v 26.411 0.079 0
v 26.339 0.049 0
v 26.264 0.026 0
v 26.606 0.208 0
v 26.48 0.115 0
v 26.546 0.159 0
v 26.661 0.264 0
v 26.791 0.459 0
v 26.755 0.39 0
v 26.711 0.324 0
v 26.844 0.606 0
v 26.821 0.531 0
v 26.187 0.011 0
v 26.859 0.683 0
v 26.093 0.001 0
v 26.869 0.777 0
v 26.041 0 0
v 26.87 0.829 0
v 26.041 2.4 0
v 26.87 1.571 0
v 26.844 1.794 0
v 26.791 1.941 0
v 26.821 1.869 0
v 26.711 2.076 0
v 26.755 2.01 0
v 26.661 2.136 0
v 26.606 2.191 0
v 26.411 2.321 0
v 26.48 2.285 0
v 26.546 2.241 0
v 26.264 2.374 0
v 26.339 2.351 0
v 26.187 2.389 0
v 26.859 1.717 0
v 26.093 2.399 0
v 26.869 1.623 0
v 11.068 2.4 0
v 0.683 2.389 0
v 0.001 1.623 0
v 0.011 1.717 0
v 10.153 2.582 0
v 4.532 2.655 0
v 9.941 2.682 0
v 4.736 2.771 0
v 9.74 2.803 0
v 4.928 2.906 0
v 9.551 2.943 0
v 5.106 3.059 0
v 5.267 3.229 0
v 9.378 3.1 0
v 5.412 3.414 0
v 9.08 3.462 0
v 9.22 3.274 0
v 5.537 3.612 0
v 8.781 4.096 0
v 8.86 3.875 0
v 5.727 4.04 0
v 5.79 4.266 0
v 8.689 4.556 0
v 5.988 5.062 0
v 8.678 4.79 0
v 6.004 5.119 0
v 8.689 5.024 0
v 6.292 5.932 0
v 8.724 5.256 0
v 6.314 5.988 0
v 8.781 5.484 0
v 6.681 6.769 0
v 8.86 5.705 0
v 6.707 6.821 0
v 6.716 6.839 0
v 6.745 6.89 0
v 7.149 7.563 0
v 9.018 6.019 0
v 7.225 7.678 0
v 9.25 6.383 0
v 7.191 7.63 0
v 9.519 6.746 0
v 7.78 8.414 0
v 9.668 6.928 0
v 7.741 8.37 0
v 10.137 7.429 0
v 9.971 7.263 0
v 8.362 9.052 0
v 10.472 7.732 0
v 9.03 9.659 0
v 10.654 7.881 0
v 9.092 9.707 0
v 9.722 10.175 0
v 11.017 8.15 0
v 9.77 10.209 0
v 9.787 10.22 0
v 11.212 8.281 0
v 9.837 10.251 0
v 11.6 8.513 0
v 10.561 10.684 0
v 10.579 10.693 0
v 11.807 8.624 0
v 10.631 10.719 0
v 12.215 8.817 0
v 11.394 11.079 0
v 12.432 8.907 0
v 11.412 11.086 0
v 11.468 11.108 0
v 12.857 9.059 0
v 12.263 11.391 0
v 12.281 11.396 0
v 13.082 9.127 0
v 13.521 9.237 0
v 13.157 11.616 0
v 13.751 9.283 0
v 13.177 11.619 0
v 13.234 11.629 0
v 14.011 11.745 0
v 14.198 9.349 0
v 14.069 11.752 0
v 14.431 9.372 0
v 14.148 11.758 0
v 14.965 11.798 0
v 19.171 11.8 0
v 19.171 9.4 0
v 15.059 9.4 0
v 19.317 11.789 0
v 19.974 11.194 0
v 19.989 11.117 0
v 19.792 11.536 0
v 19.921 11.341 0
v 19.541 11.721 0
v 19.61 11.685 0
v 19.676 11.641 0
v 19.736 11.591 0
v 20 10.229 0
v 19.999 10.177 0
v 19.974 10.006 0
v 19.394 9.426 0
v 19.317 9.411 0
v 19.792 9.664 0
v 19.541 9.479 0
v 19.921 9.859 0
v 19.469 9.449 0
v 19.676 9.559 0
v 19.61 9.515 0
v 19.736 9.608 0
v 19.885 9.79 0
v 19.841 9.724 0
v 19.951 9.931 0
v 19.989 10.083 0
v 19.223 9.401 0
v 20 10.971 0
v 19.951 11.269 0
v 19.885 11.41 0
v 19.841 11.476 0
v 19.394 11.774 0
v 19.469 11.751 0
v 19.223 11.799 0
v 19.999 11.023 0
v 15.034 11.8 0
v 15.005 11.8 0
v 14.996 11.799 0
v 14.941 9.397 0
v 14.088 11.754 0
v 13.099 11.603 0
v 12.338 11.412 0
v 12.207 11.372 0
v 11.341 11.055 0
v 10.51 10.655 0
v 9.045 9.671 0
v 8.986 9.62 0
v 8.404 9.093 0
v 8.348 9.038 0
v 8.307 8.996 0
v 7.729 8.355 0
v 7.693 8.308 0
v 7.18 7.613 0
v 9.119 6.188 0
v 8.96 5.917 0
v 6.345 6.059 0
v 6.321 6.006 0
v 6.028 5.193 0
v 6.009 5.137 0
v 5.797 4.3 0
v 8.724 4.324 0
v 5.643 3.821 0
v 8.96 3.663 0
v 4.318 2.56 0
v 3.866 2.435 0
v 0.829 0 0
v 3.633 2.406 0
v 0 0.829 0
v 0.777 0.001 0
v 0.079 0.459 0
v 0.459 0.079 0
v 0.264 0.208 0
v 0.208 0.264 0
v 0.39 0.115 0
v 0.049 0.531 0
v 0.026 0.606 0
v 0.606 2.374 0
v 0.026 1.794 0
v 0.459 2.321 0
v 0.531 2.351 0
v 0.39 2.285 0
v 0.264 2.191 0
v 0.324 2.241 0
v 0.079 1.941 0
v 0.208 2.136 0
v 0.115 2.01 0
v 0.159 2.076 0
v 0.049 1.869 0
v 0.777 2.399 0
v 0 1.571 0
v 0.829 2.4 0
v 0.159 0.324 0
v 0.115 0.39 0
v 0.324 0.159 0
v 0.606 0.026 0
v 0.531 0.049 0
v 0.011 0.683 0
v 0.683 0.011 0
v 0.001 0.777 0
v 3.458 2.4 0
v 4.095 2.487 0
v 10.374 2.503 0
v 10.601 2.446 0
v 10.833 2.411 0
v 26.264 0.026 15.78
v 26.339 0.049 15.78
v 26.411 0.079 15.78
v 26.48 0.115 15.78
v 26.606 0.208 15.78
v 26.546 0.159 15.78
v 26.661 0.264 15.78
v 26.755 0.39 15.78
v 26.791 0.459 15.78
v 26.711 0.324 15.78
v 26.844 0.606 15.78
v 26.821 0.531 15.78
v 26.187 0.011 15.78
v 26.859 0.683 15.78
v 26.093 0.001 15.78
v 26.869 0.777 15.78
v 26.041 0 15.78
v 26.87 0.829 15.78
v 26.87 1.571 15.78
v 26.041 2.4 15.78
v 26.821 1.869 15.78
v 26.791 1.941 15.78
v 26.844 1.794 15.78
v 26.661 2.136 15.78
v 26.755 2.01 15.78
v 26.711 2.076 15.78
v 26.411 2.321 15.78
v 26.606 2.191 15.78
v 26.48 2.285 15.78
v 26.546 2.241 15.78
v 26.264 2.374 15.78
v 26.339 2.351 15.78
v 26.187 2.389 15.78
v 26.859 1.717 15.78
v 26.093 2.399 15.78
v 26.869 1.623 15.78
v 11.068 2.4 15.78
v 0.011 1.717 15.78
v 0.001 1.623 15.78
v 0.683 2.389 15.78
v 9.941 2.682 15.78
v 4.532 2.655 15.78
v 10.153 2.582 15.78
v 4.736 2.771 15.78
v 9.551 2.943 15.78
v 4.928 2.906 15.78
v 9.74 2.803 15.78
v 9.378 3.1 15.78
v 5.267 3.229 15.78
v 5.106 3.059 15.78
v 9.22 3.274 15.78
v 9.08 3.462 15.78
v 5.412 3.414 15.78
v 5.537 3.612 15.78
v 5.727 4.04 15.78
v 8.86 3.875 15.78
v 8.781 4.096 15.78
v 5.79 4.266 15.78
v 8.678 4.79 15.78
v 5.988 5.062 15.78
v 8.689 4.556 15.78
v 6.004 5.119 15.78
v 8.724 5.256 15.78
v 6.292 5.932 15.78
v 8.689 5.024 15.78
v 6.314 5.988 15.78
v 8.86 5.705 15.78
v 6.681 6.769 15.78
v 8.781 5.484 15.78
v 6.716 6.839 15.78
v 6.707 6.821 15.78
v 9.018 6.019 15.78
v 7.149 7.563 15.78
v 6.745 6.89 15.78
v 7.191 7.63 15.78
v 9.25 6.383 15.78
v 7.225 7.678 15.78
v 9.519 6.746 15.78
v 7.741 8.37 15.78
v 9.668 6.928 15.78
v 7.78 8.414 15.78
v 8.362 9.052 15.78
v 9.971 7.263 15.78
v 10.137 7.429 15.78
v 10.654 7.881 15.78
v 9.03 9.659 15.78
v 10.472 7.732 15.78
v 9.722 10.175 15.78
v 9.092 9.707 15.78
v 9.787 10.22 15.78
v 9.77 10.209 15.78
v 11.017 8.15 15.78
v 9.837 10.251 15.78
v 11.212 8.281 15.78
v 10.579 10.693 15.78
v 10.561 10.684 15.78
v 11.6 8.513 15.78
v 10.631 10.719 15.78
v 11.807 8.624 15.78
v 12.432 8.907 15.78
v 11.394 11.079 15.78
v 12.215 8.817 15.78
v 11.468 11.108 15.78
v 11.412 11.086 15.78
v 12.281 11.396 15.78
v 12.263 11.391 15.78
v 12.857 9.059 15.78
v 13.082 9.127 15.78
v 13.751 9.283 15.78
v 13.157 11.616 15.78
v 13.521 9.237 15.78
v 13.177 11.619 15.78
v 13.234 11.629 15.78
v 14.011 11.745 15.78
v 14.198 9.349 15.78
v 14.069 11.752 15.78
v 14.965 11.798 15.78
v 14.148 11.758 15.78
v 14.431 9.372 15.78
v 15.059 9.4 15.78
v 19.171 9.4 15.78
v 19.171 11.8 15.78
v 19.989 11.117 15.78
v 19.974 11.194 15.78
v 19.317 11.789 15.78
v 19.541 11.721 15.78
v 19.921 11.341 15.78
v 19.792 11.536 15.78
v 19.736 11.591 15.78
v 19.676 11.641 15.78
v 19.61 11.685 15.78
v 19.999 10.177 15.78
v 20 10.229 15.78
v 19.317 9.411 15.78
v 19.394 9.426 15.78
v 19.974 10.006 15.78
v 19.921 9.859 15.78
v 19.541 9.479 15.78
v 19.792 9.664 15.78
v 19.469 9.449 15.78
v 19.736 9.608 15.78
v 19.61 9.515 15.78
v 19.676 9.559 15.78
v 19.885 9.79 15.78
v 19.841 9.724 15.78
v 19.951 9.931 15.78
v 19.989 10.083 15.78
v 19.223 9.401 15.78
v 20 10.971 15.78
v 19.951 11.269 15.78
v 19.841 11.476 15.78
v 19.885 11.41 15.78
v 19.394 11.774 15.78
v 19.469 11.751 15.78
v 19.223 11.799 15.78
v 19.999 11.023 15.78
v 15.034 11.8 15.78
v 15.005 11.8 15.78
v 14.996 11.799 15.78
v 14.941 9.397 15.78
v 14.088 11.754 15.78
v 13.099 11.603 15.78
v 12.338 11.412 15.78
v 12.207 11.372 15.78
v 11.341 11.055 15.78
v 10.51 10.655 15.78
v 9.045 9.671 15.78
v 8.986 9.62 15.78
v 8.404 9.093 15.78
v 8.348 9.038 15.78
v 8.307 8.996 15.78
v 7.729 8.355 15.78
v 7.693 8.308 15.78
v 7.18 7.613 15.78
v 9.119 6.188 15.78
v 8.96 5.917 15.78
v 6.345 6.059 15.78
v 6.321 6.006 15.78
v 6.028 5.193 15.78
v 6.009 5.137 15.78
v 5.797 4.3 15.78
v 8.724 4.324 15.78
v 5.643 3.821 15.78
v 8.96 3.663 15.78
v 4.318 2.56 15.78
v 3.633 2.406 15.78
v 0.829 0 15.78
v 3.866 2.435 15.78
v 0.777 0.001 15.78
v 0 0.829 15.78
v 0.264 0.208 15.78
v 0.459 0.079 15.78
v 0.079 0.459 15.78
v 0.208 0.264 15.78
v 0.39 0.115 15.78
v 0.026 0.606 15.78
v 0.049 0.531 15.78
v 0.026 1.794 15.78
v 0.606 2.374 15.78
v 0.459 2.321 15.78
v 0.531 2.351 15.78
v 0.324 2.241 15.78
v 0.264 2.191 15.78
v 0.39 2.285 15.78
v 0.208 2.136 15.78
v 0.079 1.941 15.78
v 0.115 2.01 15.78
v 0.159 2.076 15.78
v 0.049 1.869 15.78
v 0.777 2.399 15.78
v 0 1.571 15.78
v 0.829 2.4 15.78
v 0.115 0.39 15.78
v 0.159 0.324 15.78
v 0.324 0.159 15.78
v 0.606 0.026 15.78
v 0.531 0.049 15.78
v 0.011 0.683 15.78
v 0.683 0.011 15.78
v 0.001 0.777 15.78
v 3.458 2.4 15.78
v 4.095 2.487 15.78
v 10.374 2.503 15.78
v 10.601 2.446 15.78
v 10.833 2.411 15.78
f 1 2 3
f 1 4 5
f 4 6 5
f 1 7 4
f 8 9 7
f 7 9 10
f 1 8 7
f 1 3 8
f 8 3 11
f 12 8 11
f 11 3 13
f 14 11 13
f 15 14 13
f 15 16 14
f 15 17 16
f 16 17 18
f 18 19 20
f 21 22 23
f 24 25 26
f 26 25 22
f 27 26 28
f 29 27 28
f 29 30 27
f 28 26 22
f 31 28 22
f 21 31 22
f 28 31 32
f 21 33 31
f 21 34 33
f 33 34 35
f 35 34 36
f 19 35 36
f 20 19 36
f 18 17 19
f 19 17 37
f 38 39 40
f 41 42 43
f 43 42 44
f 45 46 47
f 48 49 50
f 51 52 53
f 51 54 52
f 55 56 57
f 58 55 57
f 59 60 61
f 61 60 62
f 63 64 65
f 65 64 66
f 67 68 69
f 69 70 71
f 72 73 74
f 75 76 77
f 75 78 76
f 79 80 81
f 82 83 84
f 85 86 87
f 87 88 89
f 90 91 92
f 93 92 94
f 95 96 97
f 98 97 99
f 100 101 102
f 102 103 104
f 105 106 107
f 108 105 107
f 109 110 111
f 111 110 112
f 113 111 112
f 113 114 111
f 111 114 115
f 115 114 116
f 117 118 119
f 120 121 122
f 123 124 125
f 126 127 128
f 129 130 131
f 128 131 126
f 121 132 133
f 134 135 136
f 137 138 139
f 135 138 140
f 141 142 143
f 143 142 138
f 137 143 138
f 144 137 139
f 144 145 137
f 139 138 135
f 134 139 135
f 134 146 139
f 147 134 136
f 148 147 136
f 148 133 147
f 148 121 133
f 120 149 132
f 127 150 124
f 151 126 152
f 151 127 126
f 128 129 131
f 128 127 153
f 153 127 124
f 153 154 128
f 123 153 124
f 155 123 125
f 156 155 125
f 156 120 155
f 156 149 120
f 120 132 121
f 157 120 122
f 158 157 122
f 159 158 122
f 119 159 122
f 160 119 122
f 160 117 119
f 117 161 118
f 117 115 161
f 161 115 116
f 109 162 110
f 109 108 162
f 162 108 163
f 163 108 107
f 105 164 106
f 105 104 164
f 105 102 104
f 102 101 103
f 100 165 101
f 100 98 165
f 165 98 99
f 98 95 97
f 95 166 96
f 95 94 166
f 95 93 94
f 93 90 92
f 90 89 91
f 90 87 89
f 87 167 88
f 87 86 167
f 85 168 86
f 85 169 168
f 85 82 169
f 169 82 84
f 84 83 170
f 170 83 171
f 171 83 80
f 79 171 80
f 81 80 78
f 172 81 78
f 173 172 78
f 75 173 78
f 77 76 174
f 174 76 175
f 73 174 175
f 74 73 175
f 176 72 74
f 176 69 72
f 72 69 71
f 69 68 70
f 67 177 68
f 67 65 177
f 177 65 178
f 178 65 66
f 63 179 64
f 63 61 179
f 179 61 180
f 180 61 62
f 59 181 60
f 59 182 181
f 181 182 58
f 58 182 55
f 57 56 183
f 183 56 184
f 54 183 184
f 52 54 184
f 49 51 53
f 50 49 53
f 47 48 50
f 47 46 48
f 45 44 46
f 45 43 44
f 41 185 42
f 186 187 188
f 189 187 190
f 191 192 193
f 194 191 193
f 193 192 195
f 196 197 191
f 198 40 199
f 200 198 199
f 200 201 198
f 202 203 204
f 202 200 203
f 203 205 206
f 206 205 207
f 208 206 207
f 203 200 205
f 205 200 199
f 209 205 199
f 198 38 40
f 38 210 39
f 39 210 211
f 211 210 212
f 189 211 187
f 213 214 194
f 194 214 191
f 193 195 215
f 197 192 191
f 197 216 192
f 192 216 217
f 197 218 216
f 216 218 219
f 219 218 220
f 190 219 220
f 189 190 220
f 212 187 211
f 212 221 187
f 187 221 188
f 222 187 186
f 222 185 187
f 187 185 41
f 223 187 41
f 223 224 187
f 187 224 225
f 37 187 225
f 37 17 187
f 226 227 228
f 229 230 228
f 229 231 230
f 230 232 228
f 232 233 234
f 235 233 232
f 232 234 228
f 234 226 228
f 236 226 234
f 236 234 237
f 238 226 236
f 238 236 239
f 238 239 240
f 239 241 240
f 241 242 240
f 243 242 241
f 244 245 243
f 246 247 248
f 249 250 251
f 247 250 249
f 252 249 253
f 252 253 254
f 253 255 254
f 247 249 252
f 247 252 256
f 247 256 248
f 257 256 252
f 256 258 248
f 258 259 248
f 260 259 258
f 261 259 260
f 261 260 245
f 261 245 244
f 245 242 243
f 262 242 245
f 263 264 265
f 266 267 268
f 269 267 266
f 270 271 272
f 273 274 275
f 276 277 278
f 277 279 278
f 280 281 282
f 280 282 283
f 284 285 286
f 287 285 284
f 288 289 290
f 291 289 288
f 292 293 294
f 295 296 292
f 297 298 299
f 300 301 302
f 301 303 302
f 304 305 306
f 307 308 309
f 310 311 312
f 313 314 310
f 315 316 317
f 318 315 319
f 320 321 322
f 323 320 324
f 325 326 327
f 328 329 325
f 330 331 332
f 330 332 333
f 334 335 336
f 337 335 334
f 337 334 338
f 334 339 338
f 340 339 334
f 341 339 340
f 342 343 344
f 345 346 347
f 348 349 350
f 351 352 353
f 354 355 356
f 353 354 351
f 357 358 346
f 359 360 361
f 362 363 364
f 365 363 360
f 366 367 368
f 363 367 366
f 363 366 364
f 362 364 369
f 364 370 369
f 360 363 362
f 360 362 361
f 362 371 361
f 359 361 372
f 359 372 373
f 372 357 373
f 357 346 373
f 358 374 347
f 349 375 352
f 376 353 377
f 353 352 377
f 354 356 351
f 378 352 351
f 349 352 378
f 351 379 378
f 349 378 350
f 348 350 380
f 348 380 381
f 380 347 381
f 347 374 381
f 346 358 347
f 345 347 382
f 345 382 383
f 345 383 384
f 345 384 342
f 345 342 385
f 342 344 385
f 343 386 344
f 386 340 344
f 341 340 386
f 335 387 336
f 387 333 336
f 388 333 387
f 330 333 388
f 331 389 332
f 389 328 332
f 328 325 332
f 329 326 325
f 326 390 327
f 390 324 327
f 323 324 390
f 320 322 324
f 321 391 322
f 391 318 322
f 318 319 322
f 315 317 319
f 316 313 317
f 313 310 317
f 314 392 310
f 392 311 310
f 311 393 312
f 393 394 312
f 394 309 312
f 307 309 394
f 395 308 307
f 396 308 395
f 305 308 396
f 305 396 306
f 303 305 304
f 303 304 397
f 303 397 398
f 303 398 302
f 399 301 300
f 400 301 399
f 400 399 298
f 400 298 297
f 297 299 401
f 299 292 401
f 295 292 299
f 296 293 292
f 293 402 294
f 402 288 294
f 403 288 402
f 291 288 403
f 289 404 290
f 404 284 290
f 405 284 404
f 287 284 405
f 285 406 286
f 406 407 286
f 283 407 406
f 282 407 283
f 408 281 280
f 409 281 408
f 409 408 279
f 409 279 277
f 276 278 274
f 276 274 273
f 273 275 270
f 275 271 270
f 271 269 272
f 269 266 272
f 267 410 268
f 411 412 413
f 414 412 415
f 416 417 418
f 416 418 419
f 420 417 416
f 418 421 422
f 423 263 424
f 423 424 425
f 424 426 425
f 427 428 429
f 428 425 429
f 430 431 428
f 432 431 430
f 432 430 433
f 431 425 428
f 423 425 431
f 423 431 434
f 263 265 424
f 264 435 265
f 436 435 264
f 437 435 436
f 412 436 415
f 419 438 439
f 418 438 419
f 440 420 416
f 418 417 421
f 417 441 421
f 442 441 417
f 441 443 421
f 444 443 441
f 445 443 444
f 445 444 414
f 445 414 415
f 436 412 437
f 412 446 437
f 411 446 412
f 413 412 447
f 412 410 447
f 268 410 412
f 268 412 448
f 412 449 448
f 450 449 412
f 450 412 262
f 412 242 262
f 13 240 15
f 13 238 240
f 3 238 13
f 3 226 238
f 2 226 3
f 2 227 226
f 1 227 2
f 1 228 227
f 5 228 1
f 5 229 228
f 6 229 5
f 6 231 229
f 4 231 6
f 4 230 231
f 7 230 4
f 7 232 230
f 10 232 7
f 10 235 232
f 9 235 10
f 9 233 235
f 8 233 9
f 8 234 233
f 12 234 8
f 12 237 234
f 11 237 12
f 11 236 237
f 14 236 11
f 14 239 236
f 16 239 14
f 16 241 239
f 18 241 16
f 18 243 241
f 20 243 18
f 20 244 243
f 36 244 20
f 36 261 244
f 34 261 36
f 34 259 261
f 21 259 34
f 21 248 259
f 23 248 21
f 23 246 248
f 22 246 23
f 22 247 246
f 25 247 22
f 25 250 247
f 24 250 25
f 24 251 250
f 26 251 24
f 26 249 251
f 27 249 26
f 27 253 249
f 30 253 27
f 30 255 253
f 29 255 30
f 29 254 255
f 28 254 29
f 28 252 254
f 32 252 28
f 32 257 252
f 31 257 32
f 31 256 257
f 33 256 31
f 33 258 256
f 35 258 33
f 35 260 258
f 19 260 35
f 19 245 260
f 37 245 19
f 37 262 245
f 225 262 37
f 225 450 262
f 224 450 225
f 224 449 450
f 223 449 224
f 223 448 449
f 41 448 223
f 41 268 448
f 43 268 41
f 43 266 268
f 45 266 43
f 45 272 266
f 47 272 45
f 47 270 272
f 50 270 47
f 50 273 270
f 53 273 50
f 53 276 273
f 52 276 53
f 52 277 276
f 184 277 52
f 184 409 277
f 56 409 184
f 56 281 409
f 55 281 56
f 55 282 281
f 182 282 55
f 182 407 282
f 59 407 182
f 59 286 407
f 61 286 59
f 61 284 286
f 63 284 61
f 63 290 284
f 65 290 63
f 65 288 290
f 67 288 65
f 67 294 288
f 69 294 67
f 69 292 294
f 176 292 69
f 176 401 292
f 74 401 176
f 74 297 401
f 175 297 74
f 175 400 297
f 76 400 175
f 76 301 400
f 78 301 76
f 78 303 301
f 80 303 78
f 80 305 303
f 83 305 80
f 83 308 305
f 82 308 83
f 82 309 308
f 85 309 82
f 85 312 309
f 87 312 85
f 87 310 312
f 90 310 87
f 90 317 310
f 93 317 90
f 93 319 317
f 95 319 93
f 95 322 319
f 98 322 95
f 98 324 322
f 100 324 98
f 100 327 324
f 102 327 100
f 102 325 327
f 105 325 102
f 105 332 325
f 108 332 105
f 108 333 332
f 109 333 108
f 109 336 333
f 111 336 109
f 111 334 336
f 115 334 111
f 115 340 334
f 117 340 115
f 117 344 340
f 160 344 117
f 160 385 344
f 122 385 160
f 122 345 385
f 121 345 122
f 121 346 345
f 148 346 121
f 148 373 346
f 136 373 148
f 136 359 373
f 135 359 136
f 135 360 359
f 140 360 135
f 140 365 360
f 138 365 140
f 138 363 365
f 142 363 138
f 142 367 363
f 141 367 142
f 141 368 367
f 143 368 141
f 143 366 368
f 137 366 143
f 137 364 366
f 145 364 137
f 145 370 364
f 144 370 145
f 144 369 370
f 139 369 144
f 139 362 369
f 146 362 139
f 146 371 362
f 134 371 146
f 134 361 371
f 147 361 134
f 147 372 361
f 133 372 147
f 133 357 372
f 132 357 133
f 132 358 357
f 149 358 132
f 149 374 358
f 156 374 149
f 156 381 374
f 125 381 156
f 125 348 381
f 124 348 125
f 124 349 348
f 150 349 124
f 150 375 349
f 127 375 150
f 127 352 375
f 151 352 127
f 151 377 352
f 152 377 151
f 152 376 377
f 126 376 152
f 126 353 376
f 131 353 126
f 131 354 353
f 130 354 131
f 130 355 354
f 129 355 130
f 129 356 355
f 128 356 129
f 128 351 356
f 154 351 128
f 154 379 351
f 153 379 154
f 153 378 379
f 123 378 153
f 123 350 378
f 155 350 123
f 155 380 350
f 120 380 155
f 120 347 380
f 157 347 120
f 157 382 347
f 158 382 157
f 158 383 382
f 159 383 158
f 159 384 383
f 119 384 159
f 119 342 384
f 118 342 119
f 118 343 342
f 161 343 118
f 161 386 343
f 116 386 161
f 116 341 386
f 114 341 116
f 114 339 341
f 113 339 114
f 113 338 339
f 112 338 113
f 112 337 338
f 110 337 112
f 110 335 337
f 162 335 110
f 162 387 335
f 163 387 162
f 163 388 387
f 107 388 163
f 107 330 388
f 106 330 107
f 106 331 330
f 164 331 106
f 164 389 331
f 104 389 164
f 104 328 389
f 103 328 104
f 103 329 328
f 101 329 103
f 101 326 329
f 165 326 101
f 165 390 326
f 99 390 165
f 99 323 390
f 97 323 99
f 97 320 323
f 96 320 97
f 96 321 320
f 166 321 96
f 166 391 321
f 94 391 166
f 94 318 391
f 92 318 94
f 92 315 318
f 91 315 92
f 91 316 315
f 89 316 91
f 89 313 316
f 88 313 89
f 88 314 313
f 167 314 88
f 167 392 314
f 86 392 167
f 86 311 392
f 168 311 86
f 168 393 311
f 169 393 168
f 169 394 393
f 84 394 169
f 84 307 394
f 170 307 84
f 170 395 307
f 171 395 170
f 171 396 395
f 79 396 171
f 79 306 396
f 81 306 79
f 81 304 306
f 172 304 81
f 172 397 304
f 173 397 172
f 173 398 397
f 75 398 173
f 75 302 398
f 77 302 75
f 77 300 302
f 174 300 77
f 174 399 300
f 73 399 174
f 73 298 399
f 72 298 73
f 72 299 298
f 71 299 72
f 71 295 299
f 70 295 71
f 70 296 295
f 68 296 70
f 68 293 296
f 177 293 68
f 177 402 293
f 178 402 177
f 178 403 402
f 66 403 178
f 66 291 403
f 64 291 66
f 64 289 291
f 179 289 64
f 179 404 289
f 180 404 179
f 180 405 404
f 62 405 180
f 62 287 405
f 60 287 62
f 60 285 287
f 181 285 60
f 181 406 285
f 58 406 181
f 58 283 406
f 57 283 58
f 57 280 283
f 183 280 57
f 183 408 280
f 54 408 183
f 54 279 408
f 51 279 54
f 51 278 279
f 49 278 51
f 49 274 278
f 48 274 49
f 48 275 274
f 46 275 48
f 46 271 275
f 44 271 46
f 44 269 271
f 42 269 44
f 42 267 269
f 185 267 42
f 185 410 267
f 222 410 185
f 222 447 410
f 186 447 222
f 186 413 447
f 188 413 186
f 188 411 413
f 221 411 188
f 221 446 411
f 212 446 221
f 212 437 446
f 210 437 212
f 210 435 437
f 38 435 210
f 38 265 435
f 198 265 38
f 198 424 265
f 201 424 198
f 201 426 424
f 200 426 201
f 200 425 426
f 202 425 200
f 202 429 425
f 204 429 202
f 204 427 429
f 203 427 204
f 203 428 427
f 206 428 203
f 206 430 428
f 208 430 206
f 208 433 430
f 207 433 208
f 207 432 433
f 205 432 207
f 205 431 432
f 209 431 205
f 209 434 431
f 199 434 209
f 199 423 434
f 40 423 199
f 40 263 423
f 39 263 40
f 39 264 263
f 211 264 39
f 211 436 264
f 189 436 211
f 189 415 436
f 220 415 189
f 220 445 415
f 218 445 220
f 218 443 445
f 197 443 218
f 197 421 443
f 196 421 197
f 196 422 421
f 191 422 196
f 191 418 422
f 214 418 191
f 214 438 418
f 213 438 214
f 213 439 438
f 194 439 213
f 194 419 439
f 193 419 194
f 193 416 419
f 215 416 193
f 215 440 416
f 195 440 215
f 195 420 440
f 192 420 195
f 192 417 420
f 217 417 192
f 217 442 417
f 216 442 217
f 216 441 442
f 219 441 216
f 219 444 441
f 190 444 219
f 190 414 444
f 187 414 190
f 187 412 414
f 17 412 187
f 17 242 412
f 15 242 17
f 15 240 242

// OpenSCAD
// Better command strip hook

$fn = 64;

sticky_len = 26.67+0.2;
sticky_wid = 15.58+0.2;
sticky_offset = 5.0;
wall_thick = 2.4;
hook_dist = 7;
hook_h = 12;
hook_offset = 8.0;

module hook2D() {
    square([sticky_len, wall_thick]);
    translate([hook_offset+hook_dist,wall_thick])
    rotate([0,0,90])
    intersection() {
        difference() {
            circle(r=hook_dist+wall_thick);
            circle(r=hook_dist);
        }
        square(hook_dist+wall_thick);
    }
    //square([wall_thick, hook_dist]);
    translate([hook_offset+hook_dist,hook_dist+wall_thick])
    square([hook_h-hook_dist, wall_thick]);
}

module hook() {
    linear_extrude(sticky_wid)
    offset(-wall_thick+0.01) offset(wall_thick-0.01)
    offset(wall_thick/3) offset(-wall_thick/3)
    hook2D();
}
hook();
